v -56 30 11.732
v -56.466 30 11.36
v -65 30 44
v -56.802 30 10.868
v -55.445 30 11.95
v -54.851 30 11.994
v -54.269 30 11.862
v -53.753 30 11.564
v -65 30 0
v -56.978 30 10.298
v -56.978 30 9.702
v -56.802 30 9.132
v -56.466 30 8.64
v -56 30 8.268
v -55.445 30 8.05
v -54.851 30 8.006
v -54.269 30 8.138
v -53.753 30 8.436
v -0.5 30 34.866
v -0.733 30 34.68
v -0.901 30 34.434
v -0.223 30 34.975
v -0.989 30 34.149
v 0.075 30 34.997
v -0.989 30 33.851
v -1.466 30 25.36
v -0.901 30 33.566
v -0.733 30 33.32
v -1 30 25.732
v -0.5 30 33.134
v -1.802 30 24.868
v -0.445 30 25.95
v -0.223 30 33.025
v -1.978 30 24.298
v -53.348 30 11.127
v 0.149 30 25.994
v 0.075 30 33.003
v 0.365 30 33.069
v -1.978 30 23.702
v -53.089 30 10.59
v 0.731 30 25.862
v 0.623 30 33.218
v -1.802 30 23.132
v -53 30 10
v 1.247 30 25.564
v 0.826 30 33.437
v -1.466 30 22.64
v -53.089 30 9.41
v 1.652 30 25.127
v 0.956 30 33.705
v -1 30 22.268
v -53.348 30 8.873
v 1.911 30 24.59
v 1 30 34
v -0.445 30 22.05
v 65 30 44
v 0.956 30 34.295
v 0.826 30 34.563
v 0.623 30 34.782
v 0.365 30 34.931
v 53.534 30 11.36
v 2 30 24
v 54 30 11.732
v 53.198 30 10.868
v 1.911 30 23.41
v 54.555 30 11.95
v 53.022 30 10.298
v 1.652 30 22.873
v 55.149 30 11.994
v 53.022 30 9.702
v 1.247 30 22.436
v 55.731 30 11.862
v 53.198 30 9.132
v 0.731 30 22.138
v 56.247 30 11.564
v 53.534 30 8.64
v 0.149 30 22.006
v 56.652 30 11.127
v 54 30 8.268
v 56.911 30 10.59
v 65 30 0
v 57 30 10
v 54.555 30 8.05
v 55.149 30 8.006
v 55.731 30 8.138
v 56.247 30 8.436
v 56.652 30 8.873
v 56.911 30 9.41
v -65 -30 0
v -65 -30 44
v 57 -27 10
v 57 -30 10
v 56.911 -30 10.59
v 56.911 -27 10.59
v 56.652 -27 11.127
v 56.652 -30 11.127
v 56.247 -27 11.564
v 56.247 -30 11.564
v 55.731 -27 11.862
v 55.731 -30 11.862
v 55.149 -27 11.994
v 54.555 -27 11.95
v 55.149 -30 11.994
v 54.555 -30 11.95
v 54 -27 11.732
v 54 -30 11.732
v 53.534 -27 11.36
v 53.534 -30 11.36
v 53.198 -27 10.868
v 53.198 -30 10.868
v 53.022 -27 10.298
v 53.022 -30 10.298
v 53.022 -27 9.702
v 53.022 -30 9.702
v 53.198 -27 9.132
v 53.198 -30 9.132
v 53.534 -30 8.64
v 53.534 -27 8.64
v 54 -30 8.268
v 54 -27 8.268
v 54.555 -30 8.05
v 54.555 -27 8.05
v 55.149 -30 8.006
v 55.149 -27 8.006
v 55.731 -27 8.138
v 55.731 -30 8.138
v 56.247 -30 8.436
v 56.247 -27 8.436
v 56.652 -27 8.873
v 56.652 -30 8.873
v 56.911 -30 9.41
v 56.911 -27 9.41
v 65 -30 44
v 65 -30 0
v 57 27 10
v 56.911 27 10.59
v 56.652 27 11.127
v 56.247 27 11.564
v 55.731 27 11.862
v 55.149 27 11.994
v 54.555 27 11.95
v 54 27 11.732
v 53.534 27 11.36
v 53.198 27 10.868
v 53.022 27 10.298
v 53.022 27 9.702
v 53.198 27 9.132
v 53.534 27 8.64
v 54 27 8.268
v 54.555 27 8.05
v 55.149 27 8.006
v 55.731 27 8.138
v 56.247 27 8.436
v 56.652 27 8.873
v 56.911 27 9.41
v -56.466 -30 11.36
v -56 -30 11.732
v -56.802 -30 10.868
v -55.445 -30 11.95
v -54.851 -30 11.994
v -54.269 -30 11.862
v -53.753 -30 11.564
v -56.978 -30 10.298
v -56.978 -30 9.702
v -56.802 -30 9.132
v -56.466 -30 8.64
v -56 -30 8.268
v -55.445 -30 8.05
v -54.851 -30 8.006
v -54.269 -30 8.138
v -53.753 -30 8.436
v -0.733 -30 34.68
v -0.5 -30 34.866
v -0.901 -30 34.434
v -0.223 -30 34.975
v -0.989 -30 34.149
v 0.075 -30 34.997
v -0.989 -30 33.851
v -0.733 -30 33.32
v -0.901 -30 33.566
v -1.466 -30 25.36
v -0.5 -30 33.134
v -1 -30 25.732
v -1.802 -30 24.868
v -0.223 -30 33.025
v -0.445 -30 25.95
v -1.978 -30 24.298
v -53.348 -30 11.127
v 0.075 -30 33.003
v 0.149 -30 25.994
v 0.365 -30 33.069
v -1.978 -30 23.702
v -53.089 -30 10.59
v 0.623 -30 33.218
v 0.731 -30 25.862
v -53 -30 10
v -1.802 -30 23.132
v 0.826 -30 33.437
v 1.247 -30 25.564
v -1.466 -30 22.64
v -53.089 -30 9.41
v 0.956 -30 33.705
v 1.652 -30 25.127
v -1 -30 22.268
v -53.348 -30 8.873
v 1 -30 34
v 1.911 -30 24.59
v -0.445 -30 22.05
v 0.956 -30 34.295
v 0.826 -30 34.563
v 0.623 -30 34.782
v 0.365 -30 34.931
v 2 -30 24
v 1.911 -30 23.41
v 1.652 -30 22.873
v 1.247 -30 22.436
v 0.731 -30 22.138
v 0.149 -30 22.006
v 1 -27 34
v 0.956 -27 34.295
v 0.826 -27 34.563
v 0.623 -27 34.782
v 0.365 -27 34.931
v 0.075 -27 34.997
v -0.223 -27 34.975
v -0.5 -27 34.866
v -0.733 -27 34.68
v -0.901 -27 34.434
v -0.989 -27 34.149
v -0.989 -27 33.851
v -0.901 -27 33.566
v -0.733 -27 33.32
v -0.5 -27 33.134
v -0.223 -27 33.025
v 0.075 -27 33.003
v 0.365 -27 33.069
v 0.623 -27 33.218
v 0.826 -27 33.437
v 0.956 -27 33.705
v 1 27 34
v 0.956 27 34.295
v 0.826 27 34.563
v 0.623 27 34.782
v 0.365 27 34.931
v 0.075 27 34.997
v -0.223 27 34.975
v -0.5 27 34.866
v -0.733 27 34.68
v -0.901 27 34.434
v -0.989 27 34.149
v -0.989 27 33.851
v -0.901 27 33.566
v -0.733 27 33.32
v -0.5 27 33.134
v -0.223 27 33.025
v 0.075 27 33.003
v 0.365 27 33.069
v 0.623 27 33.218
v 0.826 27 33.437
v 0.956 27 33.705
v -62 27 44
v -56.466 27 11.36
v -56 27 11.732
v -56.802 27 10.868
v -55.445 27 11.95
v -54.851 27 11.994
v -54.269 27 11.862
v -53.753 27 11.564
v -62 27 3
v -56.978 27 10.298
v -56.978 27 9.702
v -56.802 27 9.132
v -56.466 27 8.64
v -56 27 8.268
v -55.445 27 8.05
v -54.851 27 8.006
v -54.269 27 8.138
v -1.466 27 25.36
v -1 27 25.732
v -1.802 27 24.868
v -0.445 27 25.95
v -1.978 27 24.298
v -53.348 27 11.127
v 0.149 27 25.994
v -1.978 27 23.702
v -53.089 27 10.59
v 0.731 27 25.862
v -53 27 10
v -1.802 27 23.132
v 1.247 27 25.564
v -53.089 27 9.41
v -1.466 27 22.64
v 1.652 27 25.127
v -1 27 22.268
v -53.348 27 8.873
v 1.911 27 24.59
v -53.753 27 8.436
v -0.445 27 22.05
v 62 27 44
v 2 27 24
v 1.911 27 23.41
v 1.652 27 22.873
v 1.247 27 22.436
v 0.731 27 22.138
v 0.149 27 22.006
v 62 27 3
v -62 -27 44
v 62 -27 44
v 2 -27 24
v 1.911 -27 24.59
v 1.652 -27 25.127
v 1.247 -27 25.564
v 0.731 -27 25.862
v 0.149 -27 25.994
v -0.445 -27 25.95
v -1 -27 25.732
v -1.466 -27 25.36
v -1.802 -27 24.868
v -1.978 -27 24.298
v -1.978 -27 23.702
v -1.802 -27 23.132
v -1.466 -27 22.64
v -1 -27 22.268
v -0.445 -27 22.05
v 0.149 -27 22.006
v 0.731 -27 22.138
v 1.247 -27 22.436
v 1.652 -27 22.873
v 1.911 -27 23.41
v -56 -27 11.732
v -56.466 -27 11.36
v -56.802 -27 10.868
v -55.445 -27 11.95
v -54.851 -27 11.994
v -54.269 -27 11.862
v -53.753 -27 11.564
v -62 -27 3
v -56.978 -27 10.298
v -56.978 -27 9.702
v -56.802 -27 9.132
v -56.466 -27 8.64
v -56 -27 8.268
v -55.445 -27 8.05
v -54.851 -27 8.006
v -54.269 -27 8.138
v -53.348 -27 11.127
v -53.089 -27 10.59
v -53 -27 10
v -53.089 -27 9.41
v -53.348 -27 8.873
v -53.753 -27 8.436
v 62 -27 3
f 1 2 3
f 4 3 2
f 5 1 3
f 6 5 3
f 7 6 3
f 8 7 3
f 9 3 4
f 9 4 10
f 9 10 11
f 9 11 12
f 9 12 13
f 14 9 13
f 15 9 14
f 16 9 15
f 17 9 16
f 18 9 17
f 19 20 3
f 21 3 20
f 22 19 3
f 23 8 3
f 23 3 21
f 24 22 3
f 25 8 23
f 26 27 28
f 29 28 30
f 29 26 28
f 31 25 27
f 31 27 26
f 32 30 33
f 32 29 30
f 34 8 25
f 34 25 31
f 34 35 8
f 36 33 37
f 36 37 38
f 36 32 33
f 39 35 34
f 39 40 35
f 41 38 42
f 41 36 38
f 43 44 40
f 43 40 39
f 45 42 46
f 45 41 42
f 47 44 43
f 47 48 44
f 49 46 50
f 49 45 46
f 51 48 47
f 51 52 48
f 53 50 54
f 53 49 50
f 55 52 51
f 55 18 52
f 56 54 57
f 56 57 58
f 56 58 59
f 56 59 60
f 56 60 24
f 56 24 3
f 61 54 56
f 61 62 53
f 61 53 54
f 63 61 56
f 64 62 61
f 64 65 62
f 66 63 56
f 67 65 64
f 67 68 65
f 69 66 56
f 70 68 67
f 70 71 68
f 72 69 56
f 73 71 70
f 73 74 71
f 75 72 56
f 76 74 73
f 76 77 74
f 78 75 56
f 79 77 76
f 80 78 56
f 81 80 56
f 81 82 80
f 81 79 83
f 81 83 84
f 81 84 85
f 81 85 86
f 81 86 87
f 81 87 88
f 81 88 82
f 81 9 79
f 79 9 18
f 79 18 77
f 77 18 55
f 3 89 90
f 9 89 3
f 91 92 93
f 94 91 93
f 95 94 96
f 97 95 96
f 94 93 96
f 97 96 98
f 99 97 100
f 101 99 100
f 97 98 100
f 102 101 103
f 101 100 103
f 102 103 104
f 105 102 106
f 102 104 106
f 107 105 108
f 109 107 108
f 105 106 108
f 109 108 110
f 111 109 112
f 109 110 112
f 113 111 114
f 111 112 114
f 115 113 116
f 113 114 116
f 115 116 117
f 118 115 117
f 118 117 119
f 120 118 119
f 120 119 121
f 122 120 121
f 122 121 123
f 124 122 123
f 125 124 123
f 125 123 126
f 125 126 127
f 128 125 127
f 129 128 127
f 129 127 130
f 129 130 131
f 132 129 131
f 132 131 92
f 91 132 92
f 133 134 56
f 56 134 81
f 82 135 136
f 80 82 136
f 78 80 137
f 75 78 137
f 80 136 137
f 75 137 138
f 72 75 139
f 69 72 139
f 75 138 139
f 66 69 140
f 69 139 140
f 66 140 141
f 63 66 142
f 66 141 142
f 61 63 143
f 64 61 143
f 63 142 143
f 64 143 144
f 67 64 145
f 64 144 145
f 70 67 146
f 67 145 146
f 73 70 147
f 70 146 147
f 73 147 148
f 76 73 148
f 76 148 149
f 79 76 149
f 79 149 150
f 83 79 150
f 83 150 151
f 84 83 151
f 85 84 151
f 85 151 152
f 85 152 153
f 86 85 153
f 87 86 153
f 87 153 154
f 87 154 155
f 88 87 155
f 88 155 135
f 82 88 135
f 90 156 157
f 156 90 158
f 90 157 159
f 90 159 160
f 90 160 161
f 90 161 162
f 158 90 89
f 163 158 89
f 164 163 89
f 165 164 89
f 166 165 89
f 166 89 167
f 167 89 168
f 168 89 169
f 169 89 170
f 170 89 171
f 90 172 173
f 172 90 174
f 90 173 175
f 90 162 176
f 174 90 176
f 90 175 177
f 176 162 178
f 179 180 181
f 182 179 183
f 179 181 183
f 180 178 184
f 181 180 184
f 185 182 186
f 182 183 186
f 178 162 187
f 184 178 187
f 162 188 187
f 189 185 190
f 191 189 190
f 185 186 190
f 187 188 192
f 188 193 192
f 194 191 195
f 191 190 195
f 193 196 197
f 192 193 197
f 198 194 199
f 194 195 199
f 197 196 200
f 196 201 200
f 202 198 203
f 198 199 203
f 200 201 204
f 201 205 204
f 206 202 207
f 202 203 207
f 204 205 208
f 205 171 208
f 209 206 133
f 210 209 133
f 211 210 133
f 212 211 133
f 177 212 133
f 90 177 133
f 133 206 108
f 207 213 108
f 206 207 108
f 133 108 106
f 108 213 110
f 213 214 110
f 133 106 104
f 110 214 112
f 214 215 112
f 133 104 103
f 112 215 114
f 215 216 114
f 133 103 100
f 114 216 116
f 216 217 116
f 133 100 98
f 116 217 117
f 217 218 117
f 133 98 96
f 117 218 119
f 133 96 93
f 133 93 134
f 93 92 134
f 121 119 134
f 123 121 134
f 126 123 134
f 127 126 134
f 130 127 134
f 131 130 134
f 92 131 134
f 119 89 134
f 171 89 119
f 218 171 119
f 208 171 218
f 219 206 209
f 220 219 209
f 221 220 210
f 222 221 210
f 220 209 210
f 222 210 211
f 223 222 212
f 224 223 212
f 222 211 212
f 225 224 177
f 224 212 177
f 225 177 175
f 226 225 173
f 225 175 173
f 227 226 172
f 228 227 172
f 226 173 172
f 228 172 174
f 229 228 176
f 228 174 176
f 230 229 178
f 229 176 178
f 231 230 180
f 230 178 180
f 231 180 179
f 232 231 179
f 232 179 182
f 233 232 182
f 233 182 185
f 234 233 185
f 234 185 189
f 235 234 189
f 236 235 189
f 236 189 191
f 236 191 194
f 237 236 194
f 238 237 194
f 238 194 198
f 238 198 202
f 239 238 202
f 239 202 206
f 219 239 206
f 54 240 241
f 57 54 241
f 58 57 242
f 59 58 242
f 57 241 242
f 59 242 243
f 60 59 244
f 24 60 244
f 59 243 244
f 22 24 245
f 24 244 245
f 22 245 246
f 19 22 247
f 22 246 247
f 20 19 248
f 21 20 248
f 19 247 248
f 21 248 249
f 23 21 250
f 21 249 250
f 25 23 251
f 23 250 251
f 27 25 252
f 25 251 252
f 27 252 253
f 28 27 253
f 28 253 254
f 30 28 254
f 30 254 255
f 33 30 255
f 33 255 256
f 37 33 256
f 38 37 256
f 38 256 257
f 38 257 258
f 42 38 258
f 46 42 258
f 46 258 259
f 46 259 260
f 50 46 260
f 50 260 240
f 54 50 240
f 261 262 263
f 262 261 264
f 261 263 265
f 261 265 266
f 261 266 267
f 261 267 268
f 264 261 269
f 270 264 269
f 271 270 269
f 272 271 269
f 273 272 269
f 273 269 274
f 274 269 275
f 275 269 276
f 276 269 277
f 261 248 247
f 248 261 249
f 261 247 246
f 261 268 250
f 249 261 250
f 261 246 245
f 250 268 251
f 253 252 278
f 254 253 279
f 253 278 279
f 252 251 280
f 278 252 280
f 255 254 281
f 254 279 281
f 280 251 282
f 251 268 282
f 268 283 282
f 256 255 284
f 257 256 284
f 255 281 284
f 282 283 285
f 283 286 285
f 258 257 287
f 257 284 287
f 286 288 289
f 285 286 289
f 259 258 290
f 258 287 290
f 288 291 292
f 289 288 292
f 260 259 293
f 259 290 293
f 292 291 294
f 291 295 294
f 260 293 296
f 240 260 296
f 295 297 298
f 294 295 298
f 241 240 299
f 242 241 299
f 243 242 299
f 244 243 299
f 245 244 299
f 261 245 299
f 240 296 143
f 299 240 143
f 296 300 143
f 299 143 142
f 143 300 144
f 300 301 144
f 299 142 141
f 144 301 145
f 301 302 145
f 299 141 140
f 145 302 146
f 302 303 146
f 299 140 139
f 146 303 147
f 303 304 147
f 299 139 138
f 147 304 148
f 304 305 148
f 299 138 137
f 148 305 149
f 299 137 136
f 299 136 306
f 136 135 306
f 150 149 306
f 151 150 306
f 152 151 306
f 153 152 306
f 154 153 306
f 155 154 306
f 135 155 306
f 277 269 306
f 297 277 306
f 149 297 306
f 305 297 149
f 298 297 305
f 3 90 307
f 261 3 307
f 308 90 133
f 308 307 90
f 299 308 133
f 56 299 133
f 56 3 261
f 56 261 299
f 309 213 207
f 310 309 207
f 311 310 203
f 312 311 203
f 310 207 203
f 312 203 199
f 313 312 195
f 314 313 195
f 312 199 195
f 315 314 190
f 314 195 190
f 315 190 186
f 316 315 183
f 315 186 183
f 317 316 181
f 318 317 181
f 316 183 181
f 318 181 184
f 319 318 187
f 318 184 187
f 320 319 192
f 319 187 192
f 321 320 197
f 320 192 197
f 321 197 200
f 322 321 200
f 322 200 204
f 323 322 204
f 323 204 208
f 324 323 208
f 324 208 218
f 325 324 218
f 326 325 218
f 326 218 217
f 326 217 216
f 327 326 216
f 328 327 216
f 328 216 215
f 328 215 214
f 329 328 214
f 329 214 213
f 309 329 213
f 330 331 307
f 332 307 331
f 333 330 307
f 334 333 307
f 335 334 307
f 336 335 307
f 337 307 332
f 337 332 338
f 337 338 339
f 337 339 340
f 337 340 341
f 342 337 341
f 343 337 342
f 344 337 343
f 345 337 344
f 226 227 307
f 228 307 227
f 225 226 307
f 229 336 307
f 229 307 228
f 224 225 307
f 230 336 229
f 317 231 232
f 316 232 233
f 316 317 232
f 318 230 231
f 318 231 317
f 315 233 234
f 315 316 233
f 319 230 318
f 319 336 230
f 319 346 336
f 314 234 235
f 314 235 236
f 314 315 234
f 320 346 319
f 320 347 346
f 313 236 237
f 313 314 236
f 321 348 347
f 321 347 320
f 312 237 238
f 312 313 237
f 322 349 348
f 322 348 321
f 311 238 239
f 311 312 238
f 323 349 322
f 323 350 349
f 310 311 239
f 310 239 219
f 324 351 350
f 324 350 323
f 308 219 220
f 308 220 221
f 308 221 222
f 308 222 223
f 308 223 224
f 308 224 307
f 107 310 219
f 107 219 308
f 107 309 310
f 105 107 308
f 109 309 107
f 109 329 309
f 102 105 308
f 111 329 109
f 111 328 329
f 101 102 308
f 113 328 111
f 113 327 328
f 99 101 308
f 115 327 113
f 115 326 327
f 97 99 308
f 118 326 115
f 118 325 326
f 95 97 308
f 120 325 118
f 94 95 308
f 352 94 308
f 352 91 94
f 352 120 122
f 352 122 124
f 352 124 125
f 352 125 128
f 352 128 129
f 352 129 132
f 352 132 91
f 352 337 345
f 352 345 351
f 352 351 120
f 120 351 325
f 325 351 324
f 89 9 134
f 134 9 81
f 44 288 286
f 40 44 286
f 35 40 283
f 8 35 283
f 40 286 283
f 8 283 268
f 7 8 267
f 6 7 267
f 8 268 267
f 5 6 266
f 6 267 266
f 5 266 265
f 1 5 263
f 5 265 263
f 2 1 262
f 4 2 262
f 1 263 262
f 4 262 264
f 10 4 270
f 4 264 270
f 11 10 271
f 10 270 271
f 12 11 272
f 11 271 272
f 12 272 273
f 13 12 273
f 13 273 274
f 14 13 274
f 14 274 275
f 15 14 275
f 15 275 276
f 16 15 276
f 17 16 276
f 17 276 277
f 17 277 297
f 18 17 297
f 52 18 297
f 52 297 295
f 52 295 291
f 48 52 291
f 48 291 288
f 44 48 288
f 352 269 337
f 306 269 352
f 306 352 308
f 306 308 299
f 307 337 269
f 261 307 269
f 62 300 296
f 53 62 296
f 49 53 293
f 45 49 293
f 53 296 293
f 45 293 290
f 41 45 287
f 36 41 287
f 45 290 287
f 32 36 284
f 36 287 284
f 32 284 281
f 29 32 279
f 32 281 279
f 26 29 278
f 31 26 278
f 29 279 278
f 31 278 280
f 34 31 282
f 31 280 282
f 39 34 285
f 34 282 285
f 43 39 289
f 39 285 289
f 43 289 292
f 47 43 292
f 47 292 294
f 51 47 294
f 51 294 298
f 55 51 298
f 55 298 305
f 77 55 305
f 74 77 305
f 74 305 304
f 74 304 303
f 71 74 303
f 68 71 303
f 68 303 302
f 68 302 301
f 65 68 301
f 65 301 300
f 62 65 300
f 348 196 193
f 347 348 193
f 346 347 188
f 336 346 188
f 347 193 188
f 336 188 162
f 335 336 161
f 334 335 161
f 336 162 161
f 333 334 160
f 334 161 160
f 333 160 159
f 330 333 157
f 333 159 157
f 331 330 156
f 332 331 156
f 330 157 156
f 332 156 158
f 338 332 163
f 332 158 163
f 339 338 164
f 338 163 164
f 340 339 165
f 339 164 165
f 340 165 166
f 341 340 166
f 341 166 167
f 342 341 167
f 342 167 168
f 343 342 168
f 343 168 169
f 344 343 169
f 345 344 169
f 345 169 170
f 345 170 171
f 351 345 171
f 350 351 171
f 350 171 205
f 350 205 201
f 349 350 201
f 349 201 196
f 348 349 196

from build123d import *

# Parameters (mm, degrees)
F0_W     = 130
F0_H     = 60
F0_W_2   = 124
F0_H_2   = 54
F1_DEPTH = 44
F2_R     = 2
F2_R_2   = 1
F3_DEPTH = 60.001
F4_W     = 124
F4_H     = 54
F5_DEPTH = 3


with BuildPart() as f1:
    # F0 (on Top) → F1 (new body)
    with BuildSketch(Plane.XY):
        Rectangle(F0_W, F0_H)
        Rectangle(F0_W_2, F0_H_2, mode=Mode.SUBTRACT)
    extrude(amount=F1_DEPTH)

    # F2 (on face) → F3 (cut, through all)
    with BuildSketch(Plane.XZ.offset(30)):
        with Locations((55, 10)):
            Circle(F2_R)
        with Locations((-55, 10)):
            Circle(F2_R)
        with Locations((0, 24)):
            Circle(F2_R)
        with Locations((0, 34)):
            Circle(F2_R_2)
    extrude(amount=-F3_DEPTH, mode=Mode.SUBTRACT)

    # F4 (on Top) → F5 (join)
    with BuildSketch(Plane.XY):
        Rectangle(F4_W, F4_H)
    extrude(amount=F5_DEPTH)


solid = f1.part
